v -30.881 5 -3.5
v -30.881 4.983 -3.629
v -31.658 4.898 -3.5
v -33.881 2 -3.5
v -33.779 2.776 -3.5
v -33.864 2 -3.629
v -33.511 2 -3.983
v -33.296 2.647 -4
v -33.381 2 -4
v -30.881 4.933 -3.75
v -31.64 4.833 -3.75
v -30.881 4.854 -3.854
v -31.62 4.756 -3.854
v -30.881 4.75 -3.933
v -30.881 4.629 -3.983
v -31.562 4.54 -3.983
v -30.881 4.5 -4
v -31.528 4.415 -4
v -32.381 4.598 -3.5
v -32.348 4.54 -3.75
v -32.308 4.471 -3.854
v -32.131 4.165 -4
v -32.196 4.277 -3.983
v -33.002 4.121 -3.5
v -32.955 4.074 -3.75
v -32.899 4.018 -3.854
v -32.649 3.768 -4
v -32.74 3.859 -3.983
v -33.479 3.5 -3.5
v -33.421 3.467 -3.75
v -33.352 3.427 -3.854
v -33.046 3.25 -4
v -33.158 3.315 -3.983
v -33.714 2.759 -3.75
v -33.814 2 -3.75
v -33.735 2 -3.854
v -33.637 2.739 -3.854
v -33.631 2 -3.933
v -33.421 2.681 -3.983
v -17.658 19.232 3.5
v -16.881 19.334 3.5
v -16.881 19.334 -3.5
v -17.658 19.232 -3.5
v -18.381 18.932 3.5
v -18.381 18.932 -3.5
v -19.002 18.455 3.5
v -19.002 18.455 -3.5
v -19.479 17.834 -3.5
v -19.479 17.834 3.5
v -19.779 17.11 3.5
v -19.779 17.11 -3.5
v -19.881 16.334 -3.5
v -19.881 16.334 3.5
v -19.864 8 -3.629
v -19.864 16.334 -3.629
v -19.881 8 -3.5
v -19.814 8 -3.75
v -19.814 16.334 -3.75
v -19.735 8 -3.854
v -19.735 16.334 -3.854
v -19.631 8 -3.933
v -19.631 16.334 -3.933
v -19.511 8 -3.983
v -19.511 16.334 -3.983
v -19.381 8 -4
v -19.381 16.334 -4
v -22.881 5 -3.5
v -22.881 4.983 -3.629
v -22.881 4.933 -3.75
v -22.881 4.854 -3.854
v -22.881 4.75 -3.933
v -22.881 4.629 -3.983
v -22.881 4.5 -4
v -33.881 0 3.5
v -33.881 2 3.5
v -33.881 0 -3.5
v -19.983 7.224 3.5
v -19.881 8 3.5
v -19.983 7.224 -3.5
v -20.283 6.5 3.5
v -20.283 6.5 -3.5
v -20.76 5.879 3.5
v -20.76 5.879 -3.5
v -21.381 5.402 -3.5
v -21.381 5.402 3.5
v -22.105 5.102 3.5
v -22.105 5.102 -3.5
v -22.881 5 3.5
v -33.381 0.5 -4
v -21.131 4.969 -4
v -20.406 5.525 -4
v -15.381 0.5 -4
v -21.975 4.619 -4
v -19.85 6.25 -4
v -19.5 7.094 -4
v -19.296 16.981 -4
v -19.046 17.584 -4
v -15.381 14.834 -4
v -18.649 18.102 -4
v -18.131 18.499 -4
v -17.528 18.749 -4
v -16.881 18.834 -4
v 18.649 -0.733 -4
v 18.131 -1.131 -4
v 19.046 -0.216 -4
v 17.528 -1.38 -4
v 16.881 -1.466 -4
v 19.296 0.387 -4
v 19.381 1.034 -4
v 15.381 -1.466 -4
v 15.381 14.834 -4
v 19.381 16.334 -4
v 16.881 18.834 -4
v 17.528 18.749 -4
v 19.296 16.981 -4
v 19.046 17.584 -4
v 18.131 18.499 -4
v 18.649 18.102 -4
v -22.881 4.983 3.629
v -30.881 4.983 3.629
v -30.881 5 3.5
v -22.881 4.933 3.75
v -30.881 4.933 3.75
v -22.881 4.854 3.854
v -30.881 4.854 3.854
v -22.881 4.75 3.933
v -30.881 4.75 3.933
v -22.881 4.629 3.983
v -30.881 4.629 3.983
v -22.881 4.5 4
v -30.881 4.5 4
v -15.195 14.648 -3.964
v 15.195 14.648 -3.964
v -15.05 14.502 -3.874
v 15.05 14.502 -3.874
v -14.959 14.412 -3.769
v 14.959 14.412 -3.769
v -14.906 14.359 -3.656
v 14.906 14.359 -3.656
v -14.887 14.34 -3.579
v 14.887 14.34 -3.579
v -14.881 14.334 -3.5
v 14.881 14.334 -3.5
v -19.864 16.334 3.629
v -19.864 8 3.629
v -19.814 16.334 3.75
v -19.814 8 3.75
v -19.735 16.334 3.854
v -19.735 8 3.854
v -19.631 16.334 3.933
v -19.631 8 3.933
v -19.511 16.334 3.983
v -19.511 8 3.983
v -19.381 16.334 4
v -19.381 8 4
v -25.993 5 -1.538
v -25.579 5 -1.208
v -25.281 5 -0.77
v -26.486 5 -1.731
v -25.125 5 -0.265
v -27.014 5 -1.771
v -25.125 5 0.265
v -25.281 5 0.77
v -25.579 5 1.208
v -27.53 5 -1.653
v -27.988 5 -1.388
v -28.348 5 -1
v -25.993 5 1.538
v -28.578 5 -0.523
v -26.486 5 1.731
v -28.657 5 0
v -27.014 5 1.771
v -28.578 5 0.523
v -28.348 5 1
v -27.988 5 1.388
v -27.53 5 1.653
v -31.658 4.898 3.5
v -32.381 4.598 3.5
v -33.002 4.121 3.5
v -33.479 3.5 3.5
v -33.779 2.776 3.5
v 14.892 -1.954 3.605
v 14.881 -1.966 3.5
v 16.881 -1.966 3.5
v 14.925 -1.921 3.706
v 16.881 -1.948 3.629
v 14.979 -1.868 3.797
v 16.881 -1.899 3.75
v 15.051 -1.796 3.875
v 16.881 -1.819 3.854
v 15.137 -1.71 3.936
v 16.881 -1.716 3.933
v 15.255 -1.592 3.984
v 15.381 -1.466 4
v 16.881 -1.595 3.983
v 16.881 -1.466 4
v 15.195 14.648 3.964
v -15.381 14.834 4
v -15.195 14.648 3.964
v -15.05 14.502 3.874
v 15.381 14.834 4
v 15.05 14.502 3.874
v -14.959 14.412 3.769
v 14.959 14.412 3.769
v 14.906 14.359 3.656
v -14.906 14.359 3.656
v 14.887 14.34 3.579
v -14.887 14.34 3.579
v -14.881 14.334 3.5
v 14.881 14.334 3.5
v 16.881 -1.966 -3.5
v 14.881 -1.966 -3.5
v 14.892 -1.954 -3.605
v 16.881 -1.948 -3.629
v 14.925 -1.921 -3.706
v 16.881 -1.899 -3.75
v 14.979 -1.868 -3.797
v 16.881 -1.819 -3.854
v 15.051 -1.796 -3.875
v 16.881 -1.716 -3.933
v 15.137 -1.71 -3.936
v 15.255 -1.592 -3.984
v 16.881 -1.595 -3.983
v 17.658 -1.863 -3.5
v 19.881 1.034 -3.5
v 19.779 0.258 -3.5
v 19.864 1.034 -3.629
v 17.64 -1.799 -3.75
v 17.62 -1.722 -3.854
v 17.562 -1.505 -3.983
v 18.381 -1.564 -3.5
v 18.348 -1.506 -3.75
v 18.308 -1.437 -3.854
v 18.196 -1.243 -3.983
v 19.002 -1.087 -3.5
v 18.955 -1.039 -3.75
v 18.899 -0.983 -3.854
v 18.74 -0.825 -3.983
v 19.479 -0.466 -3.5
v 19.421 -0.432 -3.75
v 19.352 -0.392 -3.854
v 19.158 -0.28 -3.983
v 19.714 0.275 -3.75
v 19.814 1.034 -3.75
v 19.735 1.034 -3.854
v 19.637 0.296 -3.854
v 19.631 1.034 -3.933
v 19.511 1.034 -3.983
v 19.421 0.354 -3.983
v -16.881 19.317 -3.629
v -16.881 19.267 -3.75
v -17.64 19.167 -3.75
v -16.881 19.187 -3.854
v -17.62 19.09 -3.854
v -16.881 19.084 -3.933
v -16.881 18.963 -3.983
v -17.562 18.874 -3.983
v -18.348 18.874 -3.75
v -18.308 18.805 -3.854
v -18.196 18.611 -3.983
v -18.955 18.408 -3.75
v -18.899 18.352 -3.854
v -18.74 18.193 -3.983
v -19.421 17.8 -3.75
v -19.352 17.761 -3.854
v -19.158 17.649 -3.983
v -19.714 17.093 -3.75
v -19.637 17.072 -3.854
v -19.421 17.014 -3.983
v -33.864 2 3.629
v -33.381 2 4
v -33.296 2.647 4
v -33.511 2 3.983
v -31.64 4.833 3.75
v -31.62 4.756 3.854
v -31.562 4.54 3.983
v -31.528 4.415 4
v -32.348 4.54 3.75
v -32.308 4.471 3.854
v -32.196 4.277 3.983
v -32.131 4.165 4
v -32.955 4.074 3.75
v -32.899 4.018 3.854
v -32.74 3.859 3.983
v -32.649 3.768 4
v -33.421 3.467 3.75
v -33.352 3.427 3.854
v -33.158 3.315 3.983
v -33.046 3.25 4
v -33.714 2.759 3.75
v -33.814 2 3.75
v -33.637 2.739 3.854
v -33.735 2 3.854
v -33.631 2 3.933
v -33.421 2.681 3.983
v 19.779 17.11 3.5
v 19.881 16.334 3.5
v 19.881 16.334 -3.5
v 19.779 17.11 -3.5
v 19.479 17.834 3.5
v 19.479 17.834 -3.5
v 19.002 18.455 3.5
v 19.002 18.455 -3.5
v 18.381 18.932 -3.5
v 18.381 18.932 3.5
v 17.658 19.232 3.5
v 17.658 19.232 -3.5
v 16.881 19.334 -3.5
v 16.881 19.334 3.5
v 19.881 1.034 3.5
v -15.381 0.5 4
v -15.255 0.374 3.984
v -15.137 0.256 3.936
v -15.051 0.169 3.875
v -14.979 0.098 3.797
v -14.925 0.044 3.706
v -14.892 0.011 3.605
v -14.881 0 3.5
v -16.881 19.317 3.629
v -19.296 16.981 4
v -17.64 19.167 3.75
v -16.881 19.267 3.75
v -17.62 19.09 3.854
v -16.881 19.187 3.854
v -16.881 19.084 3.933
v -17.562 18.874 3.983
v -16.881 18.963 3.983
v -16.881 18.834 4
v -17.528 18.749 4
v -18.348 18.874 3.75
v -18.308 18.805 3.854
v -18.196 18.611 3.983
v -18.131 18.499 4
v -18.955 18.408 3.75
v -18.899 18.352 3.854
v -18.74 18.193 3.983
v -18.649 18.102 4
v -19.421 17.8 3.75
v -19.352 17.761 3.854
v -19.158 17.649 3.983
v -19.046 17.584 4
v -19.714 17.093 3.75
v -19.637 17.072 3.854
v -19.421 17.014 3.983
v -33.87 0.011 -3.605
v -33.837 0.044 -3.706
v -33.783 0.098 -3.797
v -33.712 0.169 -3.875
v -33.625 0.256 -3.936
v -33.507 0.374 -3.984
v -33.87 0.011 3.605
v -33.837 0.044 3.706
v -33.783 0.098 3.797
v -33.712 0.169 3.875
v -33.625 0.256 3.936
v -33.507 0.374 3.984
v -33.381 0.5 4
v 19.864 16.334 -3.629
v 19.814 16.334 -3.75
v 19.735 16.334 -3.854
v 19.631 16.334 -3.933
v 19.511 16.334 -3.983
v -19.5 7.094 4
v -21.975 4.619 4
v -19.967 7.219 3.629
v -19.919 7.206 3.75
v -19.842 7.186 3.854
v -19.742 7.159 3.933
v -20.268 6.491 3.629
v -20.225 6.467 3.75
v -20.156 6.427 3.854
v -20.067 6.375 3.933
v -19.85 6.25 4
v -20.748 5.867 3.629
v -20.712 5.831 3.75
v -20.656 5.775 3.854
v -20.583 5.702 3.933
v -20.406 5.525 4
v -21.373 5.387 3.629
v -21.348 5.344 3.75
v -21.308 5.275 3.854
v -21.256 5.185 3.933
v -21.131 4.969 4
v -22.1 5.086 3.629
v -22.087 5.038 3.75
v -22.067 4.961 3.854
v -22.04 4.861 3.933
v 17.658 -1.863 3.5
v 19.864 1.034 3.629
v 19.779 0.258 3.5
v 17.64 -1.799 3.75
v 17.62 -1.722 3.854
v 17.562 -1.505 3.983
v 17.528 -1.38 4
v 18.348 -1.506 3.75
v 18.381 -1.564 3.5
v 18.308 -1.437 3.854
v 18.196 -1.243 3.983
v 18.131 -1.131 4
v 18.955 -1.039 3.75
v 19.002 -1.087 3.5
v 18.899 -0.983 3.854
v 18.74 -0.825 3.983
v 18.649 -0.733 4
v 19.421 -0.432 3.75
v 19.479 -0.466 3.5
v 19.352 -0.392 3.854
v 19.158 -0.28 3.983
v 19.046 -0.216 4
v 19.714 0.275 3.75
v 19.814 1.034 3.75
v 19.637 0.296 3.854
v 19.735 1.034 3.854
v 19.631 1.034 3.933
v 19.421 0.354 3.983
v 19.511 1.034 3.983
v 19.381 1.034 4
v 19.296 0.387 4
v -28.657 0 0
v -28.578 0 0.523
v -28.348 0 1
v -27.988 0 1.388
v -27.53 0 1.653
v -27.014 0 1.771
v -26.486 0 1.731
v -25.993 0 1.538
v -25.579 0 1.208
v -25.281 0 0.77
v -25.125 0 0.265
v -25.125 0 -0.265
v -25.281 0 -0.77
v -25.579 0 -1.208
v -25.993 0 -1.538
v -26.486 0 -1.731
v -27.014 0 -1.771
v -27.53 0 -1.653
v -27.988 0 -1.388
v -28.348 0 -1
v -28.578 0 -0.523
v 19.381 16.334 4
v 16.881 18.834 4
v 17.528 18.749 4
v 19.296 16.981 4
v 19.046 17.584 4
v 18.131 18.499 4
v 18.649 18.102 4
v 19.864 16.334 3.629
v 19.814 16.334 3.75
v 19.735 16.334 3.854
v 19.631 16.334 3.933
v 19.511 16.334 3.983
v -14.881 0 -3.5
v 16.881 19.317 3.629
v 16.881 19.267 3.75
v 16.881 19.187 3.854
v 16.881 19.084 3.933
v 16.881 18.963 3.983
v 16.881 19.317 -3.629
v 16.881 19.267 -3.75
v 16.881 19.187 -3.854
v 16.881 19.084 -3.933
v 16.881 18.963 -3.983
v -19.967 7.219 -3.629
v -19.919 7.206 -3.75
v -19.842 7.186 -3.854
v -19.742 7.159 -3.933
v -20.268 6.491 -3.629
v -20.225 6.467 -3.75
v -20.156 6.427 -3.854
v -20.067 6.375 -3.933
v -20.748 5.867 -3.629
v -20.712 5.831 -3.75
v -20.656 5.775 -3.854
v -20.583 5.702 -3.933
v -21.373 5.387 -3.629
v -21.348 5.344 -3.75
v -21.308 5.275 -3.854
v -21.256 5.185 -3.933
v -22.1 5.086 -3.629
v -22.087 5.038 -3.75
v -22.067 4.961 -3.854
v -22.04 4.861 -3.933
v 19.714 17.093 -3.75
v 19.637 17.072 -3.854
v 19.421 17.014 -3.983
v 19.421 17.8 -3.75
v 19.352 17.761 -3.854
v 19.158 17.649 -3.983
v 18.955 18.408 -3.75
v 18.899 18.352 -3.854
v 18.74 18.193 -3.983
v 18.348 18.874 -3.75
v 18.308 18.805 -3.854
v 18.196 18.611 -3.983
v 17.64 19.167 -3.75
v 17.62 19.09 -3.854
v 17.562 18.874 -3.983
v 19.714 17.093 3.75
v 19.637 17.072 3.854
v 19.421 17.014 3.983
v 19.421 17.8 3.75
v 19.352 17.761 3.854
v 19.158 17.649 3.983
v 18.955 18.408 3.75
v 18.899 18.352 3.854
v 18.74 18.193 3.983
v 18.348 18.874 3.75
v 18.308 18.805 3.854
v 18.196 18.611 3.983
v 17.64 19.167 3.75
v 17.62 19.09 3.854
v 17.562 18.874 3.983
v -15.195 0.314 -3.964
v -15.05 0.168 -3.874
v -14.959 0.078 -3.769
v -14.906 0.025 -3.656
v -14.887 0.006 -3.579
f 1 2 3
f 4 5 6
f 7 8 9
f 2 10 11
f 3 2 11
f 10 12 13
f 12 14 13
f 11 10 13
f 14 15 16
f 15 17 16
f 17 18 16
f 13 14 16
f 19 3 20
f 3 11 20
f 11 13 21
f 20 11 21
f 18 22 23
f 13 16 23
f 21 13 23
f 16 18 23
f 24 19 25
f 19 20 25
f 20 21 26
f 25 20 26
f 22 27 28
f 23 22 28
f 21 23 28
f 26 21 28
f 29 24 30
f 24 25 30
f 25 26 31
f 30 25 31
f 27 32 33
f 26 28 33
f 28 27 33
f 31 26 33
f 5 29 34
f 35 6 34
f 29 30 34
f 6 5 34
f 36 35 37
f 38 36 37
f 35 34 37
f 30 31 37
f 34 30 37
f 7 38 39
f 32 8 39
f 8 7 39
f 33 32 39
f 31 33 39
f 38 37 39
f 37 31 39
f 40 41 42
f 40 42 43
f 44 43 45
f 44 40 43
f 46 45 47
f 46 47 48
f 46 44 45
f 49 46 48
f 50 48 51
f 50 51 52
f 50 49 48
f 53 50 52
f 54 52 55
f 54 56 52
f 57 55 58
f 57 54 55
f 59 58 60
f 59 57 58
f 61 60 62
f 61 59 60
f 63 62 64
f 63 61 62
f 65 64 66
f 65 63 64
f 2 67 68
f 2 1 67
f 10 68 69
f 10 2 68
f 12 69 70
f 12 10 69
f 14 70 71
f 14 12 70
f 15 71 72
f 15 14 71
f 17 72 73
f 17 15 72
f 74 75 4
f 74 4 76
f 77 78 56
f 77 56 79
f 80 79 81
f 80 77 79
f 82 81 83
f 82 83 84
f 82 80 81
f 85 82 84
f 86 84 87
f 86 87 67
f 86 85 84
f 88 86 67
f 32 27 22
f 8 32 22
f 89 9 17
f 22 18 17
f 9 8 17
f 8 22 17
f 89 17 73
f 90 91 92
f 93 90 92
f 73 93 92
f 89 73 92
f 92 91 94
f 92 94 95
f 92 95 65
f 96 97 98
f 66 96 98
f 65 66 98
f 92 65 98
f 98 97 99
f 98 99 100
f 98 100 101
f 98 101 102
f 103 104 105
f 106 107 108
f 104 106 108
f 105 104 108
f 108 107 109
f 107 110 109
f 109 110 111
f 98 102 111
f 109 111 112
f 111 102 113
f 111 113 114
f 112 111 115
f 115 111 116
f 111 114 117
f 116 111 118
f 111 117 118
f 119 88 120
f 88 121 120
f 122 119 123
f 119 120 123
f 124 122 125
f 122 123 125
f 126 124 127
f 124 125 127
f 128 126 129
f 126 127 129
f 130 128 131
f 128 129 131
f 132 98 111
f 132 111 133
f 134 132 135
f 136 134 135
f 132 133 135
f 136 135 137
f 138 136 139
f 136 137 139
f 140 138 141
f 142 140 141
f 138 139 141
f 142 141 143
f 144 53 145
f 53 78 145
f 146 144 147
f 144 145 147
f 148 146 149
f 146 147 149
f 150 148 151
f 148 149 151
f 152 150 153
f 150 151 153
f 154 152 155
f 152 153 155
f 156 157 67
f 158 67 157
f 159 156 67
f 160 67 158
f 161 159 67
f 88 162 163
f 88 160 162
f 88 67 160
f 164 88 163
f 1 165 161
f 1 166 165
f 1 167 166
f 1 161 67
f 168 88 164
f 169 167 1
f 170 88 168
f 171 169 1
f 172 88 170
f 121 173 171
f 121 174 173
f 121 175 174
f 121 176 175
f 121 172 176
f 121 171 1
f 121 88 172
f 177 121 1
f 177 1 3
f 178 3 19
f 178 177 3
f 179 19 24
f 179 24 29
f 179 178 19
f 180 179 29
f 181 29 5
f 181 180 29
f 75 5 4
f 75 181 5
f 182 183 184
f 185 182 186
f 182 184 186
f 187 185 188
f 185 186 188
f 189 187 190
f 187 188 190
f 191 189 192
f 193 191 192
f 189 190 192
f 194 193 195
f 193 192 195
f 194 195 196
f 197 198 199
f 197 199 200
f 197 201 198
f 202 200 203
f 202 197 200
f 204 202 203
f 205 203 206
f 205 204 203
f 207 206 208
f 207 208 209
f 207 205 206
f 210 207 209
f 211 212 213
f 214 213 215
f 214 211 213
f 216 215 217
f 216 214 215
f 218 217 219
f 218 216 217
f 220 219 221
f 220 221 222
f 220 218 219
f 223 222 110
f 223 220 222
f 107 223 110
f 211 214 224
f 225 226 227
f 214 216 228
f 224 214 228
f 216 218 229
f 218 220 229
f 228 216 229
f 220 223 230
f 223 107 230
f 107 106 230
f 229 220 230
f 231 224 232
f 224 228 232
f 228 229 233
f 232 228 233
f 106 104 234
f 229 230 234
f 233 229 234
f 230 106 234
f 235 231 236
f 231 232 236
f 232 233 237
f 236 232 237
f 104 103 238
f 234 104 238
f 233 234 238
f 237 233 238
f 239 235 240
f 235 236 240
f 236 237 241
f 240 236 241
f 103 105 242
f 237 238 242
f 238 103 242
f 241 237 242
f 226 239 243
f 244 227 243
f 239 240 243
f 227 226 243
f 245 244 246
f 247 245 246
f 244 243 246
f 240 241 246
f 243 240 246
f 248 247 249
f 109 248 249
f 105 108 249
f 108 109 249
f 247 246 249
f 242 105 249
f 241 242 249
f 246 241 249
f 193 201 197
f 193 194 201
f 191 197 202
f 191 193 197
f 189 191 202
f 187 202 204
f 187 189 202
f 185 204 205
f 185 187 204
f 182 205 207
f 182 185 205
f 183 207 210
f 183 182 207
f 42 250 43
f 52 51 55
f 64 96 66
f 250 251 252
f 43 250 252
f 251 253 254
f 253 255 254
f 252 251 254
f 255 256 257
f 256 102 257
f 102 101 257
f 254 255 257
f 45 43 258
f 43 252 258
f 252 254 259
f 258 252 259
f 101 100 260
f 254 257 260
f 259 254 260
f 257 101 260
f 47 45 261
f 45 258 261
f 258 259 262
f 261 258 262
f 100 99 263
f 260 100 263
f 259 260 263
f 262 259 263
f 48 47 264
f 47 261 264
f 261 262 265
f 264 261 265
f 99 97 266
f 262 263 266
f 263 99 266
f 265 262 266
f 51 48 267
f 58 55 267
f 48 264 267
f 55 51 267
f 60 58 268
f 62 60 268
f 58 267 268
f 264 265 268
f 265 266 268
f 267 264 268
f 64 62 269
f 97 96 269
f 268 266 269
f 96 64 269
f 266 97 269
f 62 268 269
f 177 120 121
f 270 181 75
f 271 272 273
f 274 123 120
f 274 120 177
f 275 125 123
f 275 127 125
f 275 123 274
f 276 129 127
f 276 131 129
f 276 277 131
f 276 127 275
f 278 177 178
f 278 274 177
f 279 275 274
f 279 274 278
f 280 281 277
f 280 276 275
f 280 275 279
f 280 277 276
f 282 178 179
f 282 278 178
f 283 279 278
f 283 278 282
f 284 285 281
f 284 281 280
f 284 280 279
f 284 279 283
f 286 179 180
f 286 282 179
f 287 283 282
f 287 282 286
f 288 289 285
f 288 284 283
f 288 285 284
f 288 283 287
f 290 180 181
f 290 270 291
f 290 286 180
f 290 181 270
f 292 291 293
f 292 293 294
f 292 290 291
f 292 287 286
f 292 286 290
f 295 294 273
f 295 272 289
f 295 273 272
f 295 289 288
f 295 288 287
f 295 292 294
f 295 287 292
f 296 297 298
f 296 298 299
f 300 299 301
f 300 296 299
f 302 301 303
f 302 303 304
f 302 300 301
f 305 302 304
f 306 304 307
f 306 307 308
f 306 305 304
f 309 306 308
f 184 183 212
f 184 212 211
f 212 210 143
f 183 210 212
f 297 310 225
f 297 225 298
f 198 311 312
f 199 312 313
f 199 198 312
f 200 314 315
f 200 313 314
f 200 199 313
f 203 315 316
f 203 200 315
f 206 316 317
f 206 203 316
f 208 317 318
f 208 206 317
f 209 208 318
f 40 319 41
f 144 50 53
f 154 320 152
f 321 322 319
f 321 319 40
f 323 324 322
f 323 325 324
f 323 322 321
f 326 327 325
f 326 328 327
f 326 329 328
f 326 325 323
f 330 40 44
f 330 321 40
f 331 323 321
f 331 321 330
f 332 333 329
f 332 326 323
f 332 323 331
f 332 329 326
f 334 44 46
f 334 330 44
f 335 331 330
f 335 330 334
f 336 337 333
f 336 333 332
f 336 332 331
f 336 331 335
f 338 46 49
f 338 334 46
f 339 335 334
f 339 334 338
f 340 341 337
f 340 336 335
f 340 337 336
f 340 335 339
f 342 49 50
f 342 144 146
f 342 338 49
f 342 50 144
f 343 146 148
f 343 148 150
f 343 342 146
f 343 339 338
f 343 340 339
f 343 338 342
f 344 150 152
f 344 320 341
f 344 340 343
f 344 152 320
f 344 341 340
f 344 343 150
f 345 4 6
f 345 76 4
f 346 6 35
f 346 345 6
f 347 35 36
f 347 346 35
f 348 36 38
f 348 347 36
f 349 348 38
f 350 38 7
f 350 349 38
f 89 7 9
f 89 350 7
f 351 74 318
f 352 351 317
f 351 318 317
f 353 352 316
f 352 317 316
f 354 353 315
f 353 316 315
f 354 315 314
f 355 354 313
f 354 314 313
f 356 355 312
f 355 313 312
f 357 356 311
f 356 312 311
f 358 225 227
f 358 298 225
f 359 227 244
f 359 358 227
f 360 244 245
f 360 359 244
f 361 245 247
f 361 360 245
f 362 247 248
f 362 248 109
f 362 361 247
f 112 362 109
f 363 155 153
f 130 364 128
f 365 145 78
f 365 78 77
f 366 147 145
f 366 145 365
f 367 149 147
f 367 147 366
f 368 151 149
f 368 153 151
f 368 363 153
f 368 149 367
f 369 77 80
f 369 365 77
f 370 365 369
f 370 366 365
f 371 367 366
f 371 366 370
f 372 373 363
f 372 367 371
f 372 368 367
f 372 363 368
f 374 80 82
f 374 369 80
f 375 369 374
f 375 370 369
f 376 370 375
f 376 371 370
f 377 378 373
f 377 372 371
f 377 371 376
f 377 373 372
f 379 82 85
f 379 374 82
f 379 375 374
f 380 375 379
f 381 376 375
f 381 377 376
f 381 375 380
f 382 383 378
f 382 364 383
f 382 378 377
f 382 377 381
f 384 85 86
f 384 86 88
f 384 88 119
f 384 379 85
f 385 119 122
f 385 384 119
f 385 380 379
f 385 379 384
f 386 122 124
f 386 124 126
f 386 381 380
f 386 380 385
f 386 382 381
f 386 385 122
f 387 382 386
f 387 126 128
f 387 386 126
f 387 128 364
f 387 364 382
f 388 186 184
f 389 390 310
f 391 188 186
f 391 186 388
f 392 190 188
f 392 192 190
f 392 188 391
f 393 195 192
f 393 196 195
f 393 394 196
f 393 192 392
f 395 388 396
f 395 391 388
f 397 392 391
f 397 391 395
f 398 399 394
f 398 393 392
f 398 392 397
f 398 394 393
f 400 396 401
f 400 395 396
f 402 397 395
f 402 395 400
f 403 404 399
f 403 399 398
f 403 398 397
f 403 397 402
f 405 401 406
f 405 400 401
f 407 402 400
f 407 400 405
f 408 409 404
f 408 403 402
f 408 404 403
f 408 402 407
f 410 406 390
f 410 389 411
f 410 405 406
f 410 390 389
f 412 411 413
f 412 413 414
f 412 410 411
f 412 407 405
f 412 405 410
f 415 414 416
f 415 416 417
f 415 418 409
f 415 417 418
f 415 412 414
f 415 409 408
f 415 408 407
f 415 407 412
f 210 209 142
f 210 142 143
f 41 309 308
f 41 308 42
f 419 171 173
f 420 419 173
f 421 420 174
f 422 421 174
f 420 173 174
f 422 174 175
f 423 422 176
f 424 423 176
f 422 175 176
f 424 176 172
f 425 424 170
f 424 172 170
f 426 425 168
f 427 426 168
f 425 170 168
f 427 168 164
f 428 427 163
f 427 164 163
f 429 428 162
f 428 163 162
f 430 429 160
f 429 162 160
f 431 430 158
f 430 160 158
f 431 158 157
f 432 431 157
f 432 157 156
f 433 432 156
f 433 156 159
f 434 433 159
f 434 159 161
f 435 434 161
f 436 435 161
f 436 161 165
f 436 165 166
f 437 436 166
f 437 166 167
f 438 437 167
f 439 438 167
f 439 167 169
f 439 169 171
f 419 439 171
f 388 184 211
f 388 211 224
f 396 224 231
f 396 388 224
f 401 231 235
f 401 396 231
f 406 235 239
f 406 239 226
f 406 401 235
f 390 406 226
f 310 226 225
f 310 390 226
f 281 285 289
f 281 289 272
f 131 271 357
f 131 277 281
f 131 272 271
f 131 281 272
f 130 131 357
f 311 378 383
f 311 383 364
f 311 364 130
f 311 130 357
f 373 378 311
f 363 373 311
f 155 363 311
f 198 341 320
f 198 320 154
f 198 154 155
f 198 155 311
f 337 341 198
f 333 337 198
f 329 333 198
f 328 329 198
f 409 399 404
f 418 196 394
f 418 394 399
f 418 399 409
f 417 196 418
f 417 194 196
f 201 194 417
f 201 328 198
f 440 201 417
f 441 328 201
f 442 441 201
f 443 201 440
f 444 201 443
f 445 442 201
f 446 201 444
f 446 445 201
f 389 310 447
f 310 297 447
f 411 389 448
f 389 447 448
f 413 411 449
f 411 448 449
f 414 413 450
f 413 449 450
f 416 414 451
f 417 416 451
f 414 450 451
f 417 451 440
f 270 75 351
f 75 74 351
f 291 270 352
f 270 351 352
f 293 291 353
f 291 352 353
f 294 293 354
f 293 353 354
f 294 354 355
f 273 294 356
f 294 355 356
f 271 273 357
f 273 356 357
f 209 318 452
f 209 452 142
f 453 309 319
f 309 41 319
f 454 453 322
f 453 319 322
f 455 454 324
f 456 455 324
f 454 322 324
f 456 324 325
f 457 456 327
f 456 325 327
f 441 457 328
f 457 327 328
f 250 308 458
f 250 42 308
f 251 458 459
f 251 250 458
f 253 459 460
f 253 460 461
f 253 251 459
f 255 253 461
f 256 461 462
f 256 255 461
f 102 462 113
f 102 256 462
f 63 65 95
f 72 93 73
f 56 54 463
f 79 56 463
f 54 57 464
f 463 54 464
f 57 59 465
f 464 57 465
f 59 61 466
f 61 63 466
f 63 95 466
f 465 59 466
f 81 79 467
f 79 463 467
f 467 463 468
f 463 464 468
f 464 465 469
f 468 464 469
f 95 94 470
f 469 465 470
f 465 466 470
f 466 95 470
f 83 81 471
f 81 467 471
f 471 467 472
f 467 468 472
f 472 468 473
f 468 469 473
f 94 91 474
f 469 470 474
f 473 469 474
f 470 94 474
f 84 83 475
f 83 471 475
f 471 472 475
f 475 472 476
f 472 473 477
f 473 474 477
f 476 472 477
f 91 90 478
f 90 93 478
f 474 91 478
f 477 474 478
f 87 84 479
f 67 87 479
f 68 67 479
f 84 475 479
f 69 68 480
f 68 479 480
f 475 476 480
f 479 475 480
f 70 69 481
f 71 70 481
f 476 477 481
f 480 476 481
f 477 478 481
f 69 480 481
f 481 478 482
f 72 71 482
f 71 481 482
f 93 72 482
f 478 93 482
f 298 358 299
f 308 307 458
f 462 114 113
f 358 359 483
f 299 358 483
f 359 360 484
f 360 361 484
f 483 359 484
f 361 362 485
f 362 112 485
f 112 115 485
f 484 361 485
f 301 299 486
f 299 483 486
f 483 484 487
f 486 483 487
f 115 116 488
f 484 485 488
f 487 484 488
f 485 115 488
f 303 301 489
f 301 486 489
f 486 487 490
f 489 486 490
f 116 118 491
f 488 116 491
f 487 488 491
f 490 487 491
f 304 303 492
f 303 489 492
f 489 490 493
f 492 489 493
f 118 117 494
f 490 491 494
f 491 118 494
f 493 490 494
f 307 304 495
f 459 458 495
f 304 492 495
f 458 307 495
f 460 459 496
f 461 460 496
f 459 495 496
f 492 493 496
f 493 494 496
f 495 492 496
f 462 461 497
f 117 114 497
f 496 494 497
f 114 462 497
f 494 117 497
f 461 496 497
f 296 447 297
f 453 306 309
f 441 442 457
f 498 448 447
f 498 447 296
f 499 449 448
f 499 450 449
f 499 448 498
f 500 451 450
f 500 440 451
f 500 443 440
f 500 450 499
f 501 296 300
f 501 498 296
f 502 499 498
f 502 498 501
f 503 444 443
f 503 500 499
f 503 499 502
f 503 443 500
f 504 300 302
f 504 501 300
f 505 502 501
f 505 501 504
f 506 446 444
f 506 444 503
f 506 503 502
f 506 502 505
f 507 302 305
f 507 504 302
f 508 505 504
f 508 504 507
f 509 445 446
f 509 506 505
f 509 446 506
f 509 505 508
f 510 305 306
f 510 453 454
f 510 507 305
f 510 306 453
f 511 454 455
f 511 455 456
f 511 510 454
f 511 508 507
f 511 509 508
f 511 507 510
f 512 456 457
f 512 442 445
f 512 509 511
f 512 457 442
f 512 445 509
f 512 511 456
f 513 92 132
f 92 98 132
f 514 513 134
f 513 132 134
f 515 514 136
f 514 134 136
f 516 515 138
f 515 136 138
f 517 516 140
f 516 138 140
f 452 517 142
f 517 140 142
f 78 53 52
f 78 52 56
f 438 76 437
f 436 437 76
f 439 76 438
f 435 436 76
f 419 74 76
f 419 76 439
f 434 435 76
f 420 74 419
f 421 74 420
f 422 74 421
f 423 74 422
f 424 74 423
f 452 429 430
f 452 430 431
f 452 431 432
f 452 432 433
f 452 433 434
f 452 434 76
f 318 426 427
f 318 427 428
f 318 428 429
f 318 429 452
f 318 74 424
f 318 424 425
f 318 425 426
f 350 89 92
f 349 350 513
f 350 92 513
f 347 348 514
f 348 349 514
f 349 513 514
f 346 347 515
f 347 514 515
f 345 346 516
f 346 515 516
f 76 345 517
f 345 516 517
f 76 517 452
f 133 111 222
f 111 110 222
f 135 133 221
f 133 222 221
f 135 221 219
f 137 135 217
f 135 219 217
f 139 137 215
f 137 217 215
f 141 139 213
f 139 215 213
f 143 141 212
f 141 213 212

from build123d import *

# Parameters (mm, degrees)
F1_DEPTH = 4
F2_R     = 1.775795
F3_DEPTH = 6.966509
F4_R     = 0.5


with BuildPart() as f1:
    # F0 (on Top) → F1 (new body, symmetric)
    with BuildSketch(Plane.XY):
        with BuildLine():
            Line((-33.881166, 2), (-33.881166, 0))
            Line((-33.881166, 0), (-14.881166, 0))
            Line((-14.881166, 0), (-14.881166, 14.3338))
            Line((-14.881166, 14.3338), (14.881166, 14.3338))
            Line((14.881166, 14.3338), (14.881166, -1.965509))
            Line((14.881166, -1.965509), (16.881166, -1.965509))
            ThreePointArc((16.881166, -1.965509), (19.002486, -1.08683), (19.881166, 1.034491))
            Line((19.881166, 1.034491), (19.881166, 16.3338))
            ThreePointArc((19.881166, 16.3338), (19.002486, 18.45512), (16.881166, 19.3338))
            Line((16.881166, 19.3338), (-16.881166, 19.3338))
            ThreePointArc((-16.881166, 19.3338), (-19.002486, 18.45512), (-19.881166, 16.3338))
            Line((-19.881166, 16.3338), (-19.881166, 8))
            ThreePointArc((-19.881166, 8), (-20.759845, 5.87868), (-22.881166, 5))
            Line((-22.881166, 5), (-30.881166, 5))
            ThreePointArc((-30.881166, 5), (-33.002486, 4.12132), (-33.881166, 2))
        make_face()
    extrude(amount=F1_DEPTH, both=True)

    # F2 (on face) → F3 (cut, through all)
    with BuildSketch(Plane(origin=(0, 5, 0), x_dir=(-1, 0, 0), z_dir=(0, 1, 0))):
        with Locations((26.881166, 0)):
            Circle(F2_R)
    extrude(amount=-F3_DEPTH, mode=Mode.SUBTRACT)

    # F4
    f4_edges = [f1.edges().sort_by_distance(p)[0] for p in [
        (-33.881166, 1, 4),
        (-24.381166, 0, 4),
        (-14.881166, 7.1669, 4),
        (0, 14.3338, 4),
        (14.881166, 6.184145, 4),
        (15.881166, -1.965509, 4),
        (19.002486, -1.08683, 4),
        (19.881166, 8.684145, 4),
        (19.002486, 18.45512, 4),
        (0, 19.3338, 4),
        (-19.002486, 18.45512, 4),
        (-19.881166, 12.1669, 4),
        (-20.759845, 5.87868, 4),
        (-26.881166, 5, 4),
        (-33.002486, 4.12132, 4),
        (-33.881166, 1, -4),
        (-24.381166, 0, -4),
        (-14.881166, 7.1669, -4),
        (0, 14.3338, -4),
        (14.881166, 6.184145, -4),
        (15.881166, -1.965509, -4),
        (19.002486, -1.08683, -4),
        (19.881166, 8.684145, -4),
        (19.002486, 18.45512, -4),
        (0, 19.3338, -4),
        (-19.002486, 18.45512, -4),
        (-19.881166, 12.1669, -4),
        (-20.759845, 5.87868, -4),
        (-26.881166, 5, -4),
        (-33.002486, 4.12132, -4),
    ]]
    fillet(f4_edges, radius=F4_R)


solid = f1.part
